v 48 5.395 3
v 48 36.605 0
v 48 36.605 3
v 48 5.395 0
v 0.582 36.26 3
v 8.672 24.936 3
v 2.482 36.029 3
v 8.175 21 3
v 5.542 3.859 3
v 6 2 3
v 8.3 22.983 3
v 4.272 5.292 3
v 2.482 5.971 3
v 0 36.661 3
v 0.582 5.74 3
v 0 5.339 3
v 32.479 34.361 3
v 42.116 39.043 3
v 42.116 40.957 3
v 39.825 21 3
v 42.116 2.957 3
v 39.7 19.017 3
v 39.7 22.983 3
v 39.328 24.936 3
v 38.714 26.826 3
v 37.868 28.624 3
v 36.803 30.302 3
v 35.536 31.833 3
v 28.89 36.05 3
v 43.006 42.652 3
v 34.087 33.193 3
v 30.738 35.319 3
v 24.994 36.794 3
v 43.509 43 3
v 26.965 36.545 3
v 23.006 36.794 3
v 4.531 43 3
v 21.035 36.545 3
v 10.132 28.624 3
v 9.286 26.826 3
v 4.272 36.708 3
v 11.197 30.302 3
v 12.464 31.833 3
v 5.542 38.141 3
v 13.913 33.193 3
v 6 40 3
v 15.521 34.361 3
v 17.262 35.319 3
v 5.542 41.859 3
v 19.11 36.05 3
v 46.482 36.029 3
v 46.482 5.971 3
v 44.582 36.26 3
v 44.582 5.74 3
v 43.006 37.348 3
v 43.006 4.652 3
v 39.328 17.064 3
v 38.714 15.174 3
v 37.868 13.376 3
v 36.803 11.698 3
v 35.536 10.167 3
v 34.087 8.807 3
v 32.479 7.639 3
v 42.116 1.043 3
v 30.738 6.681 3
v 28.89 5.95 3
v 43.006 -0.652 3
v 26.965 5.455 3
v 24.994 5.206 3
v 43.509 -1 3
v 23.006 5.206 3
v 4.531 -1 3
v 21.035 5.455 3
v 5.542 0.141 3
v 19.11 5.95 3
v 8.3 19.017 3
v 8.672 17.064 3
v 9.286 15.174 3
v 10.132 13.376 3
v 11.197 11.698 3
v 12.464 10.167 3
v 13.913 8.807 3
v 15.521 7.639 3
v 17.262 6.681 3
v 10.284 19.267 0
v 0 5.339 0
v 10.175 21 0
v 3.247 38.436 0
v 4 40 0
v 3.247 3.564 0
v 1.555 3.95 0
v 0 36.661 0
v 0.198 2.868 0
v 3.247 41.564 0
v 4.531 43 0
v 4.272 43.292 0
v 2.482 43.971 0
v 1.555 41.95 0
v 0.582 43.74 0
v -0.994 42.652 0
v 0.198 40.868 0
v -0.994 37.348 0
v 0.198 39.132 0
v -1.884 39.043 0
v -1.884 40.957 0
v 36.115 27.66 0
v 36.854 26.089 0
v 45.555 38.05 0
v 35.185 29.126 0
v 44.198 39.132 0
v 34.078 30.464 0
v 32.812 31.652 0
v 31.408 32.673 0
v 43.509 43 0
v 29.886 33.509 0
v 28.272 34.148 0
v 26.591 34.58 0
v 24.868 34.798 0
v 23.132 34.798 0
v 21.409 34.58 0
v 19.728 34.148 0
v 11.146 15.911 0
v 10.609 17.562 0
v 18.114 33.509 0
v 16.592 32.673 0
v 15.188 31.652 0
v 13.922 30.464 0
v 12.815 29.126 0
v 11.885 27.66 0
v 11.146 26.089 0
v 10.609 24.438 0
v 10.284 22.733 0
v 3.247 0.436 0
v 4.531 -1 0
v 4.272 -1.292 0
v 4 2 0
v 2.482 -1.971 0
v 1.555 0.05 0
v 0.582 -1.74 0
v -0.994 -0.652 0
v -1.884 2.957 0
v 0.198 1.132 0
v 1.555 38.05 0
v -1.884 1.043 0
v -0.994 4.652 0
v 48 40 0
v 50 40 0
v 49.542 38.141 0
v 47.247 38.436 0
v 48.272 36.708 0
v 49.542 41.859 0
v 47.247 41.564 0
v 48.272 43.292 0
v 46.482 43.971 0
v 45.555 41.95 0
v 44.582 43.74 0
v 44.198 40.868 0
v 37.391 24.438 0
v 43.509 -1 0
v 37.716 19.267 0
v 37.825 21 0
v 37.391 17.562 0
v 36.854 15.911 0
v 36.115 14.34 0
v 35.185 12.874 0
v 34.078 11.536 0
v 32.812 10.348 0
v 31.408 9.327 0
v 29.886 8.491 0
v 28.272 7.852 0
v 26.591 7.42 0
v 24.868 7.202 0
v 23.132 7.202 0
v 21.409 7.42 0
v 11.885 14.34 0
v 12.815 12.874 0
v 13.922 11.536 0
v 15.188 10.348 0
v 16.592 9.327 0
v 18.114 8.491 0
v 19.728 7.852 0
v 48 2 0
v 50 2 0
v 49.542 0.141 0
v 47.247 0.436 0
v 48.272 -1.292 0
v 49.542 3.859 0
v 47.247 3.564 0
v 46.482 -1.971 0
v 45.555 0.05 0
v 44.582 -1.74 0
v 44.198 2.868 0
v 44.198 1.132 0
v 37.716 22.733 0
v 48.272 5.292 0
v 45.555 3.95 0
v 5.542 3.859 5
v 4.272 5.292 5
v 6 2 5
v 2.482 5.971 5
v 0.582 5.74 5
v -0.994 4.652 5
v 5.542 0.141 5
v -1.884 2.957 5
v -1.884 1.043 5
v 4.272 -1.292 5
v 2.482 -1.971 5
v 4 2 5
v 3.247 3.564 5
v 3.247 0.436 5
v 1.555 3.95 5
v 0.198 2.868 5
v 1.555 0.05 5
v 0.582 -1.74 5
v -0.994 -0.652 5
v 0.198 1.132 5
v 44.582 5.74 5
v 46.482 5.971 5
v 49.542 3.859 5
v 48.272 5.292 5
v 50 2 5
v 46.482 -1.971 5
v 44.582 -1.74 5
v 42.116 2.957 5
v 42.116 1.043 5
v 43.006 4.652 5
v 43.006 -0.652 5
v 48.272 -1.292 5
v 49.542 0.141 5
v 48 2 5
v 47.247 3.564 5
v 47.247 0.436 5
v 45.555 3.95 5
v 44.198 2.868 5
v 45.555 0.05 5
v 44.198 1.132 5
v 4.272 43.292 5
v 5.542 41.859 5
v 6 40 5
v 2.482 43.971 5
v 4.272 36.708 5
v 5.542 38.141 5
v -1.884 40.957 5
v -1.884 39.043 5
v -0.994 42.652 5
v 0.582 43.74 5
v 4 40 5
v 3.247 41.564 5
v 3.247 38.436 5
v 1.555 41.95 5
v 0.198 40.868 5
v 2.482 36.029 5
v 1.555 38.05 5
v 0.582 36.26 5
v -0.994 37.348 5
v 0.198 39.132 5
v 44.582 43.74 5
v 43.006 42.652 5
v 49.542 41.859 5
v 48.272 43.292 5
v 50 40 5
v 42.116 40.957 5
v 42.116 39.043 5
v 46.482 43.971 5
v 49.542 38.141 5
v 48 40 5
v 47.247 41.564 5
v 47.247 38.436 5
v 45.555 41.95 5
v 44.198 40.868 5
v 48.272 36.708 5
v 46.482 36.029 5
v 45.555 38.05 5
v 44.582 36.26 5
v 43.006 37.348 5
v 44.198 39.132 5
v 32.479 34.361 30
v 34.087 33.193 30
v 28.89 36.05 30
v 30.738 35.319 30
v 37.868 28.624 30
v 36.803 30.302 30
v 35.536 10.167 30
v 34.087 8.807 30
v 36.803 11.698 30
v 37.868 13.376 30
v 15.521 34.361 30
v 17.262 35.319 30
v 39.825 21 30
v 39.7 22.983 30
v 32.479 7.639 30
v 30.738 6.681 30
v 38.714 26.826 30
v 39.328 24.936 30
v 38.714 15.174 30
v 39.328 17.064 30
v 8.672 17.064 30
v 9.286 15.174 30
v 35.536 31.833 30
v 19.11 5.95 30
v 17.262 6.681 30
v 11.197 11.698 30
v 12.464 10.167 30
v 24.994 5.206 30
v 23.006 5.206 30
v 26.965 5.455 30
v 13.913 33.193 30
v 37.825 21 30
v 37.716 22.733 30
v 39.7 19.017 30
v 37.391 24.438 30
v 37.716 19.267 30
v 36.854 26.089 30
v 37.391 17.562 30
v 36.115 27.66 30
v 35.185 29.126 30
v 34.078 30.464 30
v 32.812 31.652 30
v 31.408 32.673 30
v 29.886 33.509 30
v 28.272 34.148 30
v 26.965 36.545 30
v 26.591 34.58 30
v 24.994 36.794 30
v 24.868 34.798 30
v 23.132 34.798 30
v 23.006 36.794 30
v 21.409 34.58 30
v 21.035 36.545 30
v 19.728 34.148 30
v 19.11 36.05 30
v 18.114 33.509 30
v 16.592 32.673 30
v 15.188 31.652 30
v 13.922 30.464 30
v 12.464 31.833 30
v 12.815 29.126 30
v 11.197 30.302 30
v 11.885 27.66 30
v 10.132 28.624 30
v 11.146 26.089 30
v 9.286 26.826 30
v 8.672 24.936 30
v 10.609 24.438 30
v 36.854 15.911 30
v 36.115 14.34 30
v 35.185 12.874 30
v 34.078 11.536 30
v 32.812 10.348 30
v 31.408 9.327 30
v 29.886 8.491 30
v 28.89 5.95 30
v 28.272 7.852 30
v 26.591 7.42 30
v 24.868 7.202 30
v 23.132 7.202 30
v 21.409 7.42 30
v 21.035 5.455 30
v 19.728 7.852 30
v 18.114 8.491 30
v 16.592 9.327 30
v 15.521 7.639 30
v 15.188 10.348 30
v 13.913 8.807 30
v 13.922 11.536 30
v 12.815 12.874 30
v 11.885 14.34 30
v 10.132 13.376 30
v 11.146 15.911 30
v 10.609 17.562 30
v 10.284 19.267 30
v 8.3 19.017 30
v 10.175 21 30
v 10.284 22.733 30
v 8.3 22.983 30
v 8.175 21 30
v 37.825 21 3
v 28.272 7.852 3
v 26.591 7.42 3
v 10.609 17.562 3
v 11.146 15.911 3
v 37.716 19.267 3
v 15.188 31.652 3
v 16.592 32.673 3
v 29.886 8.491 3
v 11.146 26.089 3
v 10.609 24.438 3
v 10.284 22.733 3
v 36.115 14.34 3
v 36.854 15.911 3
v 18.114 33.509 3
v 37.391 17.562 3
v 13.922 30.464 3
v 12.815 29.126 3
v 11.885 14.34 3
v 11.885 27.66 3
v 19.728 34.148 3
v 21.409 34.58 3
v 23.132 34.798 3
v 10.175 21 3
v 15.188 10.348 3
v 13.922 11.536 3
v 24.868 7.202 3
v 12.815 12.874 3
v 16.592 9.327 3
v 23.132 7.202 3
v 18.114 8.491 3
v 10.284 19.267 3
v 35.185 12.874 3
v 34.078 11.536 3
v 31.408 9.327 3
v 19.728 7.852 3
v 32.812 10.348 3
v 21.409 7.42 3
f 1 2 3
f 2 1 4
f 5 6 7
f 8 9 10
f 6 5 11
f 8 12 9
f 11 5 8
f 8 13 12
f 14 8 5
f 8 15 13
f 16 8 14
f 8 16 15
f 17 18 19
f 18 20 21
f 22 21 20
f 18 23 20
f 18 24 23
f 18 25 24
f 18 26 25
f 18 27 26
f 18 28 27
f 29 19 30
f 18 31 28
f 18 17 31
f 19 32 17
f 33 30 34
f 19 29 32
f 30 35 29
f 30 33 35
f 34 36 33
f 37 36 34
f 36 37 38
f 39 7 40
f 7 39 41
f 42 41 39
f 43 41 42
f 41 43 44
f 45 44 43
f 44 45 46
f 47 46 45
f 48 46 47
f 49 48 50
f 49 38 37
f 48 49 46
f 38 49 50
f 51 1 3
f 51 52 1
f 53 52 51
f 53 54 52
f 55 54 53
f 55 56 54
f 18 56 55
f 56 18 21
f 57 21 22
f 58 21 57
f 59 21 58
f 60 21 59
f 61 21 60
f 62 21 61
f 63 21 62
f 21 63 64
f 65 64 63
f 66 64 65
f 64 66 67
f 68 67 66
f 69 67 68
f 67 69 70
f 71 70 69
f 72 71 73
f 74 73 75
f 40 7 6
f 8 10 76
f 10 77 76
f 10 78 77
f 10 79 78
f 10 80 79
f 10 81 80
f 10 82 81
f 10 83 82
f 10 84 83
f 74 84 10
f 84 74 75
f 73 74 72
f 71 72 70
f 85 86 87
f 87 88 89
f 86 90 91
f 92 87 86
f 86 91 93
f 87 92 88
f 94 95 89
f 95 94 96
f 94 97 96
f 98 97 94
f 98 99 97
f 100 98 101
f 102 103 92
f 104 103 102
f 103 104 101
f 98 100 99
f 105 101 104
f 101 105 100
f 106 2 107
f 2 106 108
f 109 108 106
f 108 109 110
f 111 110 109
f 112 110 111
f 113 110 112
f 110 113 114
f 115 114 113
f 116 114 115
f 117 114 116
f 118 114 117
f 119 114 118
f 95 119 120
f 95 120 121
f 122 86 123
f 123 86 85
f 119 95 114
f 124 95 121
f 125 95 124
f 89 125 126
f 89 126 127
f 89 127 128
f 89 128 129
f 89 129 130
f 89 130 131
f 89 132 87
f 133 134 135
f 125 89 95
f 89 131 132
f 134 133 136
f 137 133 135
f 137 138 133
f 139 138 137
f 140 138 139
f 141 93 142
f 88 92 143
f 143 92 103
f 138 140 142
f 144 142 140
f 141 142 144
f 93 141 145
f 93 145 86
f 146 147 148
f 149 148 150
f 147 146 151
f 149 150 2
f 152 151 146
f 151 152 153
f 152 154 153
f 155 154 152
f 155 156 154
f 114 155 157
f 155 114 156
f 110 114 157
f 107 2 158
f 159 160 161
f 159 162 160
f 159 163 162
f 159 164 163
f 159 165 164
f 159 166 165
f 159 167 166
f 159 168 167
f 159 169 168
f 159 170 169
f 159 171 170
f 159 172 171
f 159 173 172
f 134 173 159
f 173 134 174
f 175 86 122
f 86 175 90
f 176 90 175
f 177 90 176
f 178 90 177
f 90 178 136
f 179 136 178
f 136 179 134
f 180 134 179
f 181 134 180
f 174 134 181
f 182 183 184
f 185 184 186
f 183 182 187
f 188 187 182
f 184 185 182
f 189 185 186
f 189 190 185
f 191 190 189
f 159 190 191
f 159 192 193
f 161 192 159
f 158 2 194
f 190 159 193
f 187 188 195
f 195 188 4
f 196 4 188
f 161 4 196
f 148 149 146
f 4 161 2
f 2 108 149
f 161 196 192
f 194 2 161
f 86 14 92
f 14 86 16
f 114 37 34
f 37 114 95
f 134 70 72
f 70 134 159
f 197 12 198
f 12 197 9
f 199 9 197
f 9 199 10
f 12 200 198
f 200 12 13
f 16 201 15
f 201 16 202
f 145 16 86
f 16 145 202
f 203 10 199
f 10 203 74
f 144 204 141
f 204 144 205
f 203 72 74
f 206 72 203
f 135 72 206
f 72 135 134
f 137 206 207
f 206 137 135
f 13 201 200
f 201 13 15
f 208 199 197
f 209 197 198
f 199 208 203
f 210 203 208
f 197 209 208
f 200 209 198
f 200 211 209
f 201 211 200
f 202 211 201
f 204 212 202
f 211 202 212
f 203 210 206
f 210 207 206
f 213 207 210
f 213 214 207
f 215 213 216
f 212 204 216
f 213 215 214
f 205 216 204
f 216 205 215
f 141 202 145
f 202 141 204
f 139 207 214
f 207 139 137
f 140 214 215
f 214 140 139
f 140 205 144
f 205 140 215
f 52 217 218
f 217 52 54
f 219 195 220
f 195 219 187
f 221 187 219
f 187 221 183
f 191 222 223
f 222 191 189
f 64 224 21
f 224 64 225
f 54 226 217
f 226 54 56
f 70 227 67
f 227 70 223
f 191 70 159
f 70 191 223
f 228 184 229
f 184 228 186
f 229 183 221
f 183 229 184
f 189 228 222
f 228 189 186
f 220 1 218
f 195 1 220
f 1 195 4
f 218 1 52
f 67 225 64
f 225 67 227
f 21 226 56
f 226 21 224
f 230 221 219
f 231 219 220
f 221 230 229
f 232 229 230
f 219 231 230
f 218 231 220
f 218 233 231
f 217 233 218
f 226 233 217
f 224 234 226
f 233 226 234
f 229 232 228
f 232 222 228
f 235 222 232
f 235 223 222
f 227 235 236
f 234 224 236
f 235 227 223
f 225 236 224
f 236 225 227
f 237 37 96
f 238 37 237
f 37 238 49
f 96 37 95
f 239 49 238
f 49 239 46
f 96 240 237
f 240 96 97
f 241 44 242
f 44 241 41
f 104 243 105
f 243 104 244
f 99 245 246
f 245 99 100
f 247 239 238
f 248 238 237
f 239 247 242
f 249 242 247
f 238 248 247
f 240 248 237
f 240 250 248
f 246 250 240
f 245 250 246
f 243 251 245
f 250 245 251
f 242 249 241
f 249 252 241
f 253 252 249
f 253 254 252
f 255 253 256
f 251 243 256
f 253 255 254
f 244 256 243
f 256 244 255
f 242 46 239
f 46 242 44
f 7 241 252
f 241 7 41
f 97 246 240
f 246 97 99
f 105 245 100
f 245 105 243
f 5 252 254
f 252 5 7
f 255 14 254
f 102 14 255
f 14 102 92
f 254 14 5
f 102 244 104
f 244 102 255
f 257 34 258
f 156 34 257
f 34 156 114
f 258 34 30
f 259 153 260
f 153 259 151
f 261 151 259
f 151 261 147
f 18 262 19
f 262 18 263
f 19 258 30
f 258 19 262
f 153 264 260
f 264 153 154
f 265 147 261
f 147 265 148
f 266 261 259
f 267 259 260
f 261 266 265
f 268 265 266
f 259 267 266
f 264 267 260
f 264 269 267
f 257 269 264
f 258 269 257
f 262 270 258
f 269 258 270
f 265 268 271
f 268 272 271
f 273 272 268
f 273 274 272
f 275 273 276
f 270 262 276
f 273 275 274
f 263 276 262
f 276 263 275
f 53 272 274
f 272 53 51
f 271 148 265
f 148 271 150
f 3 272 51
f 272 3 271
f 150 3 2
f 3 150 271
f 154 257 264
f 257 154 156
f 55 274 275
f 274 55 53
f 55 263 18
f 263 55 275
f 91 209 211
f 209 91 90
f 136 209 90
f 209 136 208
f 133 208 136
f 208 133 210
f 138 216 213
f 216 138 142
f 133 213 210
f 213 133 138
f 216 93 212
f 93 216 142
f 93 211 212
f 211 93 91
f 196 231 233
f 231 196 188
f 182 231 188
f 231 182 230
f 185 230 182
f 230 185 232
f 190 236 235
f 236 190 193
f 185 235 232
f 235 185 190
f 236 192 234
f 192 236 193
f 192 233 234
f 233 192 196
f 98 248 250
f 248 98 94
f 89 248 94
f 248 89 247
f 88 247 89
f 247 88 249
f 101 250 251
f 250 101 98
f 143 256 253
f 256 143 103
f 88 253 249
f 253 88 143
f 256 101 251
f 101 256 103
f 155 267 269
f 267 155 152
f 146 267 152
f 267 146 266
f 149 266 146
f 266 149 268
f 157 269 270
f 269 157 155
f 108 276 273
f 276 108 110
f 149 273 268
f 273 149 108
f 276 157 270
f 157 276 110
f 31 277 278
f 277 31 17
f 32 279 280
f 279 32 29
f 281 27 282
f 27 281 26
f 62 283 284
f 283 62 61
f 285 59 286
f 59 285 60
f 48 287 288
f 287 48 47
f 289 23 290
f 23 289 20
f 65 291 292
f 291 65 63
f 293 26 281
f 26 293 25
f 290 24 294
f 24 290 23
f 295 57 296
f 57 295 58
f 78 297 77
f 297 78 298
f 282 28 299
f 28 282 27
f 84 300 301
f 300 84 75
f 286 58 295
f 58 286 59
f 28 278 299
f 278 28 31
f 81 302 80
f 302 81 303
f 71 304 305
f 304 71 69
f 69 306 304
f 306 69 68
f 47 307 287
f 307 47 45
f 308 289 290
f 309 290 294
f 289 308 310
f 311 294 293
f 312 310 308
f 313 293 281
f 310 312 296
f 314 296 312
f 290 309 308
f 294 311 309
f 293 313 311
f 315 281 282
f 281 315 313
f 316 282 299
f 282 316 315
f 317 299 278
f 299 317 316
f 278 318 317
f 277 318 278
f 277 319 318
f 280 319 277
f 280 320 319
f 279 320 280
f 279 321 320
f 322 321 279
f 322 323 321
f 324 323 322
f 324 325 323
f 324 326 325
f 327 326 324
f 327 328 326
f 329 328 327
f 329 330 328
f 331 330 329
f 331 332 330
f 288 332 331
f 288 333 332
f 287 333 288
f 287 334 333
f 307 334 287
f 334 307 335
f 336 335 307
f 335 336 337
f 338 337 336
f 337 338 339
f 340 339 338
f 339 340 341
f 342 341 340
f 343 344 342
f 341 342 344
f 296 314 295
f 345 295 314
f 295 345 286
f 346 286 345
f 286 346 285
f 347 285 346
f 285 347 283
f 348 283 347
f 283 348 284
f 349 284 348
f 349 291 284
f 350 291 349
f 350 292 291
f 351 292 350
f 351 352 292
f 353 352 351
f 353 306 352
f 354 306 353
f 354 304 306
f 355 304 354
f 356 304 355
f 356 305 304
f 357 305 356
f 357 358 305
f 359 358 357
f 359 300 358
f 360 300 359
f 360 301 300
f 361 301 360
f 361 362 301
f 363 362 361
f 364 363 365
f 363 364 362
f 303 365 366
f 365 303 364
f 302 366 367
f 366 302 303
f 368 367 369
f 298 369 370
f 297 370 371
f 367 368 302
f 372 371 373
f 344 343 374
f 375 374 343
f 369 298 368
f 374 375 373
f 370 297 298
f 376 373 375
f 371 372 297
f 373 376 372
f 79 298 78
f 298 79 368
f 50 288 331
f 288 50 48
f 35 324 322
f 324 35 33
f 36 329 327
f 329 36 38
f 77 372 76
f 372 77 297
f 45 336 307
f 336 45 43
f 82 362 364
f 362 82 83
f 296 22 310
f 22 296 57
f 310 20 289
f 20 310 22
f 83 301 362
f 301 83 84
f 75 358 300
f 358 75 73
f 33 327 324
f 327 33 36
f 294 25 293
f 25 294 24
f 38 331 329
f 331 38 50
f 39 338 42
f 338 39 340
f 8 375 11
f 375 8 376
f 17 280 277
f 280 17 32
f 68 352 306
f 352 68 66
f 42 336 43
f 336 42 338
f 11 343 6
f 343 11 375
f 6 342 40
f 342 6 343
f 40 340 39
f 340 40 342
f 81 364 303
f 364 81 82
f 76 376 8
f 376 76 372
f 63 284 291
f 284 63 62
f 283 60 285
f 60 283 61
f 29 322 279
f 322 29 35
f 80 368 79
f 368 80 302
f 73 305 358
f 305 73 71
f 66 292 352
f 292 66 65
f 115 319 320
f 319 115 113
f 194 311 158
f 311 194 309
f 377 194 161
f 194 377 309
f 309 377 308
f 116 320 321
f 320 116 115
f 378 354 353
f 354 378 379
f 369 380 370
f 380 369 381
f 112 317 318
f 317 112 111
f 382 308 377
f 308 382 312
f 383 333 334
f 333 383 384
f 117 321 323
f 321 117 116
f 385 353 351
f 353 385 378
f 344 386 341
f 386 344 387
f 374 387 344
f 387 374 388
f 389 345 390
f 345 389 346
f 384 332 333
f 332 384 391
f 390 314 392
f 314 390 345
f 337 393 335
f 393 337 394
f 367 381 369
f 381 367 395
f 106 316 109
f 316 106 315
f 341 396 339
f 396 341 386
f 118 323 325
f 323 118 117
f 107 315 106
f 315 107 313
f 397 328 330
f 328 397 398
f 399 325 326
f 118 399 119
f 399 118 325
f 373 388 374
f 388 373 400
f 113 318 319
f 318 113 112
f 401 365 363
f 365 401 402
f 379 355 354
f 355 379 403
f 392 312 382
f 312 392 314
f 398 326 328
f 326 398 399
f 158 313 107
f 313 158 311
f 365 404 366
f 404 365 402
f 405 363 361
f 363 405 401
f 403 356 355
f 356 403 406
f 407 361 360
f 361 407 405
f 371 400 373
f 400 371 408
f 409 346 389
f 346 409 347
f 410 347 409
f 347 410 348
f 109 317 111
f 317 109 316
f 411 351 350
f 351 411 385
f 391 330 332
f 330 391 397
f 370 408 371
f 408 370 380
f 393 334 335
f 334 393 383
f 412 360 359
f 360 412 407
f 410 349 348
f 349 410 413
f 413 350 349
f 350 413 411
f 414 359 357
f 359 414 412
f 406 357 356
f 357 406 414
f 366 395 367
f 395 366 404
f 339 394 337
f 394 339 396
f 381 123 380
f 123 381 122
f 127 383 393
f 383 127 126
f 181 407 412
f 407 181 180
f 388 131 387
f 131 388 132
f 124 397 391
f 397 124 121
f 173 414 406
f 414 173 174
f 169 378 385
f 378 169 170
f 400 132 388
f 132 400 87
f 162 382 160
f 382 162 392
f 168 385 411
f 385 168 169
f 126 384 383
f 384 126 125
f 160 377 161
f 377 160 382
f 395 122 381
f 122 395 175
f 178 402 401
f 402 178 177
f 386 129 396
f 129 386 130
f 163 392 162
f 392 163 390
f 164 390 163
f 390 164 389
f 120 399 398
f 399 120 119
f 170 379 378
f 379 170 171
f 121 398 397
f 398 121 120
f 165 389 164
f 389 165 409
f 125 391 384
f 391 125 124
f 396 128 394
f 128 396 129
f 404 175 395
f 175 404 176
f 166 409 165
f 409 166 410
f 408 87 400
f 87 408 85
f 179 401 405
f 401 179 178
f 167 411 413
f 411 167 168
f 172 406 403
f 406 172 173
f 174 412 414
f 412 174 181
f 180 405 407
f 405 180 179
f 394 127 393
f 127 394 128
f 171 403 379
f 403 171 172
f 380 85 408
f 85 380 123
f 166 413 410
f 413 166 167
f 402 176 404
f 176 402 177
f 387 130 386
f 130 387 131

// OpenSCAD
/* 
 * 2016, bruno.keymolen@gmail.com
 *
 * Mak 127
 * 1.25" -> 31.75mm
 *
 * Older scopes
 * 0.965" -> 24.5mm
 */

// Diameter of eyepiece
eyepieceDiameter = 31.75; // [31.65:1.25 Inch, 24.5:0.965 Inch]

// Substract a fraction from the diameter to have a smooth fit, could be 0.0
diameterDeductMillimeter = 0.1; // [0.0:0.0 mm,0.05:0.05 mm,0.1:0.10 mm,0.2:0.20 mm,0.3:0.30 mm,0.5:0.50 mm]


module ignore()
{
}

eyepiece_r = (eyepieceDiameter-diameterDeductMillimeter)/2;

height = 3;

module base1()
{
        translate([0,-1,0])
        {
            cube(size=[48, 44, height], center=false);
        }
       
    }


module base2()
{
    base1();
    translate([2,2,0])
    cylinder(h=height+2, r1=4, r2=4);
    translate([46,2,0])
    cylinder(h=height+2, r1=4, r2=4);
    translate([2,40,0])
    cylinder(h=height+2, r1=4, r2=4);
    translate([46,40,0])
    cylinder(h=height+2, r1=4, r2=4);
}

module base3()
{
    difference()
    {
        base2();
        translate([2,2,0])
        cylinder(h=height+2, r1=2, r2=2);
        translate([46,2,0])
        cylinder(h=height+2, r1=2, r2=2);
        translate([2,40,0])
        cylinder(h=height+2, r1=2, r2=2);
        translate([46,40,0])
        cylinder(h=height+2, r1=2, r2=2);
    }
}


module lens1()
{
    difference()
    {
    cylinder(h=30,r1=eyepiece_r,r2=eyepiece_r, $fn=50);
    cylinder(h=30,r1=eyepiece_r-2,r2=eyepiece_r-2, $fn=50);
    }
}

module lens2()
{
    base3();
    translate([24,21])
    {
        lens1();
    }
}

difference()
{
lens2();
    translate([24,21])
    {
        cylinder(h=height,r1=eyepiece_r-2,r2=eyepiece_r-2, $fn=50);
    }
}
